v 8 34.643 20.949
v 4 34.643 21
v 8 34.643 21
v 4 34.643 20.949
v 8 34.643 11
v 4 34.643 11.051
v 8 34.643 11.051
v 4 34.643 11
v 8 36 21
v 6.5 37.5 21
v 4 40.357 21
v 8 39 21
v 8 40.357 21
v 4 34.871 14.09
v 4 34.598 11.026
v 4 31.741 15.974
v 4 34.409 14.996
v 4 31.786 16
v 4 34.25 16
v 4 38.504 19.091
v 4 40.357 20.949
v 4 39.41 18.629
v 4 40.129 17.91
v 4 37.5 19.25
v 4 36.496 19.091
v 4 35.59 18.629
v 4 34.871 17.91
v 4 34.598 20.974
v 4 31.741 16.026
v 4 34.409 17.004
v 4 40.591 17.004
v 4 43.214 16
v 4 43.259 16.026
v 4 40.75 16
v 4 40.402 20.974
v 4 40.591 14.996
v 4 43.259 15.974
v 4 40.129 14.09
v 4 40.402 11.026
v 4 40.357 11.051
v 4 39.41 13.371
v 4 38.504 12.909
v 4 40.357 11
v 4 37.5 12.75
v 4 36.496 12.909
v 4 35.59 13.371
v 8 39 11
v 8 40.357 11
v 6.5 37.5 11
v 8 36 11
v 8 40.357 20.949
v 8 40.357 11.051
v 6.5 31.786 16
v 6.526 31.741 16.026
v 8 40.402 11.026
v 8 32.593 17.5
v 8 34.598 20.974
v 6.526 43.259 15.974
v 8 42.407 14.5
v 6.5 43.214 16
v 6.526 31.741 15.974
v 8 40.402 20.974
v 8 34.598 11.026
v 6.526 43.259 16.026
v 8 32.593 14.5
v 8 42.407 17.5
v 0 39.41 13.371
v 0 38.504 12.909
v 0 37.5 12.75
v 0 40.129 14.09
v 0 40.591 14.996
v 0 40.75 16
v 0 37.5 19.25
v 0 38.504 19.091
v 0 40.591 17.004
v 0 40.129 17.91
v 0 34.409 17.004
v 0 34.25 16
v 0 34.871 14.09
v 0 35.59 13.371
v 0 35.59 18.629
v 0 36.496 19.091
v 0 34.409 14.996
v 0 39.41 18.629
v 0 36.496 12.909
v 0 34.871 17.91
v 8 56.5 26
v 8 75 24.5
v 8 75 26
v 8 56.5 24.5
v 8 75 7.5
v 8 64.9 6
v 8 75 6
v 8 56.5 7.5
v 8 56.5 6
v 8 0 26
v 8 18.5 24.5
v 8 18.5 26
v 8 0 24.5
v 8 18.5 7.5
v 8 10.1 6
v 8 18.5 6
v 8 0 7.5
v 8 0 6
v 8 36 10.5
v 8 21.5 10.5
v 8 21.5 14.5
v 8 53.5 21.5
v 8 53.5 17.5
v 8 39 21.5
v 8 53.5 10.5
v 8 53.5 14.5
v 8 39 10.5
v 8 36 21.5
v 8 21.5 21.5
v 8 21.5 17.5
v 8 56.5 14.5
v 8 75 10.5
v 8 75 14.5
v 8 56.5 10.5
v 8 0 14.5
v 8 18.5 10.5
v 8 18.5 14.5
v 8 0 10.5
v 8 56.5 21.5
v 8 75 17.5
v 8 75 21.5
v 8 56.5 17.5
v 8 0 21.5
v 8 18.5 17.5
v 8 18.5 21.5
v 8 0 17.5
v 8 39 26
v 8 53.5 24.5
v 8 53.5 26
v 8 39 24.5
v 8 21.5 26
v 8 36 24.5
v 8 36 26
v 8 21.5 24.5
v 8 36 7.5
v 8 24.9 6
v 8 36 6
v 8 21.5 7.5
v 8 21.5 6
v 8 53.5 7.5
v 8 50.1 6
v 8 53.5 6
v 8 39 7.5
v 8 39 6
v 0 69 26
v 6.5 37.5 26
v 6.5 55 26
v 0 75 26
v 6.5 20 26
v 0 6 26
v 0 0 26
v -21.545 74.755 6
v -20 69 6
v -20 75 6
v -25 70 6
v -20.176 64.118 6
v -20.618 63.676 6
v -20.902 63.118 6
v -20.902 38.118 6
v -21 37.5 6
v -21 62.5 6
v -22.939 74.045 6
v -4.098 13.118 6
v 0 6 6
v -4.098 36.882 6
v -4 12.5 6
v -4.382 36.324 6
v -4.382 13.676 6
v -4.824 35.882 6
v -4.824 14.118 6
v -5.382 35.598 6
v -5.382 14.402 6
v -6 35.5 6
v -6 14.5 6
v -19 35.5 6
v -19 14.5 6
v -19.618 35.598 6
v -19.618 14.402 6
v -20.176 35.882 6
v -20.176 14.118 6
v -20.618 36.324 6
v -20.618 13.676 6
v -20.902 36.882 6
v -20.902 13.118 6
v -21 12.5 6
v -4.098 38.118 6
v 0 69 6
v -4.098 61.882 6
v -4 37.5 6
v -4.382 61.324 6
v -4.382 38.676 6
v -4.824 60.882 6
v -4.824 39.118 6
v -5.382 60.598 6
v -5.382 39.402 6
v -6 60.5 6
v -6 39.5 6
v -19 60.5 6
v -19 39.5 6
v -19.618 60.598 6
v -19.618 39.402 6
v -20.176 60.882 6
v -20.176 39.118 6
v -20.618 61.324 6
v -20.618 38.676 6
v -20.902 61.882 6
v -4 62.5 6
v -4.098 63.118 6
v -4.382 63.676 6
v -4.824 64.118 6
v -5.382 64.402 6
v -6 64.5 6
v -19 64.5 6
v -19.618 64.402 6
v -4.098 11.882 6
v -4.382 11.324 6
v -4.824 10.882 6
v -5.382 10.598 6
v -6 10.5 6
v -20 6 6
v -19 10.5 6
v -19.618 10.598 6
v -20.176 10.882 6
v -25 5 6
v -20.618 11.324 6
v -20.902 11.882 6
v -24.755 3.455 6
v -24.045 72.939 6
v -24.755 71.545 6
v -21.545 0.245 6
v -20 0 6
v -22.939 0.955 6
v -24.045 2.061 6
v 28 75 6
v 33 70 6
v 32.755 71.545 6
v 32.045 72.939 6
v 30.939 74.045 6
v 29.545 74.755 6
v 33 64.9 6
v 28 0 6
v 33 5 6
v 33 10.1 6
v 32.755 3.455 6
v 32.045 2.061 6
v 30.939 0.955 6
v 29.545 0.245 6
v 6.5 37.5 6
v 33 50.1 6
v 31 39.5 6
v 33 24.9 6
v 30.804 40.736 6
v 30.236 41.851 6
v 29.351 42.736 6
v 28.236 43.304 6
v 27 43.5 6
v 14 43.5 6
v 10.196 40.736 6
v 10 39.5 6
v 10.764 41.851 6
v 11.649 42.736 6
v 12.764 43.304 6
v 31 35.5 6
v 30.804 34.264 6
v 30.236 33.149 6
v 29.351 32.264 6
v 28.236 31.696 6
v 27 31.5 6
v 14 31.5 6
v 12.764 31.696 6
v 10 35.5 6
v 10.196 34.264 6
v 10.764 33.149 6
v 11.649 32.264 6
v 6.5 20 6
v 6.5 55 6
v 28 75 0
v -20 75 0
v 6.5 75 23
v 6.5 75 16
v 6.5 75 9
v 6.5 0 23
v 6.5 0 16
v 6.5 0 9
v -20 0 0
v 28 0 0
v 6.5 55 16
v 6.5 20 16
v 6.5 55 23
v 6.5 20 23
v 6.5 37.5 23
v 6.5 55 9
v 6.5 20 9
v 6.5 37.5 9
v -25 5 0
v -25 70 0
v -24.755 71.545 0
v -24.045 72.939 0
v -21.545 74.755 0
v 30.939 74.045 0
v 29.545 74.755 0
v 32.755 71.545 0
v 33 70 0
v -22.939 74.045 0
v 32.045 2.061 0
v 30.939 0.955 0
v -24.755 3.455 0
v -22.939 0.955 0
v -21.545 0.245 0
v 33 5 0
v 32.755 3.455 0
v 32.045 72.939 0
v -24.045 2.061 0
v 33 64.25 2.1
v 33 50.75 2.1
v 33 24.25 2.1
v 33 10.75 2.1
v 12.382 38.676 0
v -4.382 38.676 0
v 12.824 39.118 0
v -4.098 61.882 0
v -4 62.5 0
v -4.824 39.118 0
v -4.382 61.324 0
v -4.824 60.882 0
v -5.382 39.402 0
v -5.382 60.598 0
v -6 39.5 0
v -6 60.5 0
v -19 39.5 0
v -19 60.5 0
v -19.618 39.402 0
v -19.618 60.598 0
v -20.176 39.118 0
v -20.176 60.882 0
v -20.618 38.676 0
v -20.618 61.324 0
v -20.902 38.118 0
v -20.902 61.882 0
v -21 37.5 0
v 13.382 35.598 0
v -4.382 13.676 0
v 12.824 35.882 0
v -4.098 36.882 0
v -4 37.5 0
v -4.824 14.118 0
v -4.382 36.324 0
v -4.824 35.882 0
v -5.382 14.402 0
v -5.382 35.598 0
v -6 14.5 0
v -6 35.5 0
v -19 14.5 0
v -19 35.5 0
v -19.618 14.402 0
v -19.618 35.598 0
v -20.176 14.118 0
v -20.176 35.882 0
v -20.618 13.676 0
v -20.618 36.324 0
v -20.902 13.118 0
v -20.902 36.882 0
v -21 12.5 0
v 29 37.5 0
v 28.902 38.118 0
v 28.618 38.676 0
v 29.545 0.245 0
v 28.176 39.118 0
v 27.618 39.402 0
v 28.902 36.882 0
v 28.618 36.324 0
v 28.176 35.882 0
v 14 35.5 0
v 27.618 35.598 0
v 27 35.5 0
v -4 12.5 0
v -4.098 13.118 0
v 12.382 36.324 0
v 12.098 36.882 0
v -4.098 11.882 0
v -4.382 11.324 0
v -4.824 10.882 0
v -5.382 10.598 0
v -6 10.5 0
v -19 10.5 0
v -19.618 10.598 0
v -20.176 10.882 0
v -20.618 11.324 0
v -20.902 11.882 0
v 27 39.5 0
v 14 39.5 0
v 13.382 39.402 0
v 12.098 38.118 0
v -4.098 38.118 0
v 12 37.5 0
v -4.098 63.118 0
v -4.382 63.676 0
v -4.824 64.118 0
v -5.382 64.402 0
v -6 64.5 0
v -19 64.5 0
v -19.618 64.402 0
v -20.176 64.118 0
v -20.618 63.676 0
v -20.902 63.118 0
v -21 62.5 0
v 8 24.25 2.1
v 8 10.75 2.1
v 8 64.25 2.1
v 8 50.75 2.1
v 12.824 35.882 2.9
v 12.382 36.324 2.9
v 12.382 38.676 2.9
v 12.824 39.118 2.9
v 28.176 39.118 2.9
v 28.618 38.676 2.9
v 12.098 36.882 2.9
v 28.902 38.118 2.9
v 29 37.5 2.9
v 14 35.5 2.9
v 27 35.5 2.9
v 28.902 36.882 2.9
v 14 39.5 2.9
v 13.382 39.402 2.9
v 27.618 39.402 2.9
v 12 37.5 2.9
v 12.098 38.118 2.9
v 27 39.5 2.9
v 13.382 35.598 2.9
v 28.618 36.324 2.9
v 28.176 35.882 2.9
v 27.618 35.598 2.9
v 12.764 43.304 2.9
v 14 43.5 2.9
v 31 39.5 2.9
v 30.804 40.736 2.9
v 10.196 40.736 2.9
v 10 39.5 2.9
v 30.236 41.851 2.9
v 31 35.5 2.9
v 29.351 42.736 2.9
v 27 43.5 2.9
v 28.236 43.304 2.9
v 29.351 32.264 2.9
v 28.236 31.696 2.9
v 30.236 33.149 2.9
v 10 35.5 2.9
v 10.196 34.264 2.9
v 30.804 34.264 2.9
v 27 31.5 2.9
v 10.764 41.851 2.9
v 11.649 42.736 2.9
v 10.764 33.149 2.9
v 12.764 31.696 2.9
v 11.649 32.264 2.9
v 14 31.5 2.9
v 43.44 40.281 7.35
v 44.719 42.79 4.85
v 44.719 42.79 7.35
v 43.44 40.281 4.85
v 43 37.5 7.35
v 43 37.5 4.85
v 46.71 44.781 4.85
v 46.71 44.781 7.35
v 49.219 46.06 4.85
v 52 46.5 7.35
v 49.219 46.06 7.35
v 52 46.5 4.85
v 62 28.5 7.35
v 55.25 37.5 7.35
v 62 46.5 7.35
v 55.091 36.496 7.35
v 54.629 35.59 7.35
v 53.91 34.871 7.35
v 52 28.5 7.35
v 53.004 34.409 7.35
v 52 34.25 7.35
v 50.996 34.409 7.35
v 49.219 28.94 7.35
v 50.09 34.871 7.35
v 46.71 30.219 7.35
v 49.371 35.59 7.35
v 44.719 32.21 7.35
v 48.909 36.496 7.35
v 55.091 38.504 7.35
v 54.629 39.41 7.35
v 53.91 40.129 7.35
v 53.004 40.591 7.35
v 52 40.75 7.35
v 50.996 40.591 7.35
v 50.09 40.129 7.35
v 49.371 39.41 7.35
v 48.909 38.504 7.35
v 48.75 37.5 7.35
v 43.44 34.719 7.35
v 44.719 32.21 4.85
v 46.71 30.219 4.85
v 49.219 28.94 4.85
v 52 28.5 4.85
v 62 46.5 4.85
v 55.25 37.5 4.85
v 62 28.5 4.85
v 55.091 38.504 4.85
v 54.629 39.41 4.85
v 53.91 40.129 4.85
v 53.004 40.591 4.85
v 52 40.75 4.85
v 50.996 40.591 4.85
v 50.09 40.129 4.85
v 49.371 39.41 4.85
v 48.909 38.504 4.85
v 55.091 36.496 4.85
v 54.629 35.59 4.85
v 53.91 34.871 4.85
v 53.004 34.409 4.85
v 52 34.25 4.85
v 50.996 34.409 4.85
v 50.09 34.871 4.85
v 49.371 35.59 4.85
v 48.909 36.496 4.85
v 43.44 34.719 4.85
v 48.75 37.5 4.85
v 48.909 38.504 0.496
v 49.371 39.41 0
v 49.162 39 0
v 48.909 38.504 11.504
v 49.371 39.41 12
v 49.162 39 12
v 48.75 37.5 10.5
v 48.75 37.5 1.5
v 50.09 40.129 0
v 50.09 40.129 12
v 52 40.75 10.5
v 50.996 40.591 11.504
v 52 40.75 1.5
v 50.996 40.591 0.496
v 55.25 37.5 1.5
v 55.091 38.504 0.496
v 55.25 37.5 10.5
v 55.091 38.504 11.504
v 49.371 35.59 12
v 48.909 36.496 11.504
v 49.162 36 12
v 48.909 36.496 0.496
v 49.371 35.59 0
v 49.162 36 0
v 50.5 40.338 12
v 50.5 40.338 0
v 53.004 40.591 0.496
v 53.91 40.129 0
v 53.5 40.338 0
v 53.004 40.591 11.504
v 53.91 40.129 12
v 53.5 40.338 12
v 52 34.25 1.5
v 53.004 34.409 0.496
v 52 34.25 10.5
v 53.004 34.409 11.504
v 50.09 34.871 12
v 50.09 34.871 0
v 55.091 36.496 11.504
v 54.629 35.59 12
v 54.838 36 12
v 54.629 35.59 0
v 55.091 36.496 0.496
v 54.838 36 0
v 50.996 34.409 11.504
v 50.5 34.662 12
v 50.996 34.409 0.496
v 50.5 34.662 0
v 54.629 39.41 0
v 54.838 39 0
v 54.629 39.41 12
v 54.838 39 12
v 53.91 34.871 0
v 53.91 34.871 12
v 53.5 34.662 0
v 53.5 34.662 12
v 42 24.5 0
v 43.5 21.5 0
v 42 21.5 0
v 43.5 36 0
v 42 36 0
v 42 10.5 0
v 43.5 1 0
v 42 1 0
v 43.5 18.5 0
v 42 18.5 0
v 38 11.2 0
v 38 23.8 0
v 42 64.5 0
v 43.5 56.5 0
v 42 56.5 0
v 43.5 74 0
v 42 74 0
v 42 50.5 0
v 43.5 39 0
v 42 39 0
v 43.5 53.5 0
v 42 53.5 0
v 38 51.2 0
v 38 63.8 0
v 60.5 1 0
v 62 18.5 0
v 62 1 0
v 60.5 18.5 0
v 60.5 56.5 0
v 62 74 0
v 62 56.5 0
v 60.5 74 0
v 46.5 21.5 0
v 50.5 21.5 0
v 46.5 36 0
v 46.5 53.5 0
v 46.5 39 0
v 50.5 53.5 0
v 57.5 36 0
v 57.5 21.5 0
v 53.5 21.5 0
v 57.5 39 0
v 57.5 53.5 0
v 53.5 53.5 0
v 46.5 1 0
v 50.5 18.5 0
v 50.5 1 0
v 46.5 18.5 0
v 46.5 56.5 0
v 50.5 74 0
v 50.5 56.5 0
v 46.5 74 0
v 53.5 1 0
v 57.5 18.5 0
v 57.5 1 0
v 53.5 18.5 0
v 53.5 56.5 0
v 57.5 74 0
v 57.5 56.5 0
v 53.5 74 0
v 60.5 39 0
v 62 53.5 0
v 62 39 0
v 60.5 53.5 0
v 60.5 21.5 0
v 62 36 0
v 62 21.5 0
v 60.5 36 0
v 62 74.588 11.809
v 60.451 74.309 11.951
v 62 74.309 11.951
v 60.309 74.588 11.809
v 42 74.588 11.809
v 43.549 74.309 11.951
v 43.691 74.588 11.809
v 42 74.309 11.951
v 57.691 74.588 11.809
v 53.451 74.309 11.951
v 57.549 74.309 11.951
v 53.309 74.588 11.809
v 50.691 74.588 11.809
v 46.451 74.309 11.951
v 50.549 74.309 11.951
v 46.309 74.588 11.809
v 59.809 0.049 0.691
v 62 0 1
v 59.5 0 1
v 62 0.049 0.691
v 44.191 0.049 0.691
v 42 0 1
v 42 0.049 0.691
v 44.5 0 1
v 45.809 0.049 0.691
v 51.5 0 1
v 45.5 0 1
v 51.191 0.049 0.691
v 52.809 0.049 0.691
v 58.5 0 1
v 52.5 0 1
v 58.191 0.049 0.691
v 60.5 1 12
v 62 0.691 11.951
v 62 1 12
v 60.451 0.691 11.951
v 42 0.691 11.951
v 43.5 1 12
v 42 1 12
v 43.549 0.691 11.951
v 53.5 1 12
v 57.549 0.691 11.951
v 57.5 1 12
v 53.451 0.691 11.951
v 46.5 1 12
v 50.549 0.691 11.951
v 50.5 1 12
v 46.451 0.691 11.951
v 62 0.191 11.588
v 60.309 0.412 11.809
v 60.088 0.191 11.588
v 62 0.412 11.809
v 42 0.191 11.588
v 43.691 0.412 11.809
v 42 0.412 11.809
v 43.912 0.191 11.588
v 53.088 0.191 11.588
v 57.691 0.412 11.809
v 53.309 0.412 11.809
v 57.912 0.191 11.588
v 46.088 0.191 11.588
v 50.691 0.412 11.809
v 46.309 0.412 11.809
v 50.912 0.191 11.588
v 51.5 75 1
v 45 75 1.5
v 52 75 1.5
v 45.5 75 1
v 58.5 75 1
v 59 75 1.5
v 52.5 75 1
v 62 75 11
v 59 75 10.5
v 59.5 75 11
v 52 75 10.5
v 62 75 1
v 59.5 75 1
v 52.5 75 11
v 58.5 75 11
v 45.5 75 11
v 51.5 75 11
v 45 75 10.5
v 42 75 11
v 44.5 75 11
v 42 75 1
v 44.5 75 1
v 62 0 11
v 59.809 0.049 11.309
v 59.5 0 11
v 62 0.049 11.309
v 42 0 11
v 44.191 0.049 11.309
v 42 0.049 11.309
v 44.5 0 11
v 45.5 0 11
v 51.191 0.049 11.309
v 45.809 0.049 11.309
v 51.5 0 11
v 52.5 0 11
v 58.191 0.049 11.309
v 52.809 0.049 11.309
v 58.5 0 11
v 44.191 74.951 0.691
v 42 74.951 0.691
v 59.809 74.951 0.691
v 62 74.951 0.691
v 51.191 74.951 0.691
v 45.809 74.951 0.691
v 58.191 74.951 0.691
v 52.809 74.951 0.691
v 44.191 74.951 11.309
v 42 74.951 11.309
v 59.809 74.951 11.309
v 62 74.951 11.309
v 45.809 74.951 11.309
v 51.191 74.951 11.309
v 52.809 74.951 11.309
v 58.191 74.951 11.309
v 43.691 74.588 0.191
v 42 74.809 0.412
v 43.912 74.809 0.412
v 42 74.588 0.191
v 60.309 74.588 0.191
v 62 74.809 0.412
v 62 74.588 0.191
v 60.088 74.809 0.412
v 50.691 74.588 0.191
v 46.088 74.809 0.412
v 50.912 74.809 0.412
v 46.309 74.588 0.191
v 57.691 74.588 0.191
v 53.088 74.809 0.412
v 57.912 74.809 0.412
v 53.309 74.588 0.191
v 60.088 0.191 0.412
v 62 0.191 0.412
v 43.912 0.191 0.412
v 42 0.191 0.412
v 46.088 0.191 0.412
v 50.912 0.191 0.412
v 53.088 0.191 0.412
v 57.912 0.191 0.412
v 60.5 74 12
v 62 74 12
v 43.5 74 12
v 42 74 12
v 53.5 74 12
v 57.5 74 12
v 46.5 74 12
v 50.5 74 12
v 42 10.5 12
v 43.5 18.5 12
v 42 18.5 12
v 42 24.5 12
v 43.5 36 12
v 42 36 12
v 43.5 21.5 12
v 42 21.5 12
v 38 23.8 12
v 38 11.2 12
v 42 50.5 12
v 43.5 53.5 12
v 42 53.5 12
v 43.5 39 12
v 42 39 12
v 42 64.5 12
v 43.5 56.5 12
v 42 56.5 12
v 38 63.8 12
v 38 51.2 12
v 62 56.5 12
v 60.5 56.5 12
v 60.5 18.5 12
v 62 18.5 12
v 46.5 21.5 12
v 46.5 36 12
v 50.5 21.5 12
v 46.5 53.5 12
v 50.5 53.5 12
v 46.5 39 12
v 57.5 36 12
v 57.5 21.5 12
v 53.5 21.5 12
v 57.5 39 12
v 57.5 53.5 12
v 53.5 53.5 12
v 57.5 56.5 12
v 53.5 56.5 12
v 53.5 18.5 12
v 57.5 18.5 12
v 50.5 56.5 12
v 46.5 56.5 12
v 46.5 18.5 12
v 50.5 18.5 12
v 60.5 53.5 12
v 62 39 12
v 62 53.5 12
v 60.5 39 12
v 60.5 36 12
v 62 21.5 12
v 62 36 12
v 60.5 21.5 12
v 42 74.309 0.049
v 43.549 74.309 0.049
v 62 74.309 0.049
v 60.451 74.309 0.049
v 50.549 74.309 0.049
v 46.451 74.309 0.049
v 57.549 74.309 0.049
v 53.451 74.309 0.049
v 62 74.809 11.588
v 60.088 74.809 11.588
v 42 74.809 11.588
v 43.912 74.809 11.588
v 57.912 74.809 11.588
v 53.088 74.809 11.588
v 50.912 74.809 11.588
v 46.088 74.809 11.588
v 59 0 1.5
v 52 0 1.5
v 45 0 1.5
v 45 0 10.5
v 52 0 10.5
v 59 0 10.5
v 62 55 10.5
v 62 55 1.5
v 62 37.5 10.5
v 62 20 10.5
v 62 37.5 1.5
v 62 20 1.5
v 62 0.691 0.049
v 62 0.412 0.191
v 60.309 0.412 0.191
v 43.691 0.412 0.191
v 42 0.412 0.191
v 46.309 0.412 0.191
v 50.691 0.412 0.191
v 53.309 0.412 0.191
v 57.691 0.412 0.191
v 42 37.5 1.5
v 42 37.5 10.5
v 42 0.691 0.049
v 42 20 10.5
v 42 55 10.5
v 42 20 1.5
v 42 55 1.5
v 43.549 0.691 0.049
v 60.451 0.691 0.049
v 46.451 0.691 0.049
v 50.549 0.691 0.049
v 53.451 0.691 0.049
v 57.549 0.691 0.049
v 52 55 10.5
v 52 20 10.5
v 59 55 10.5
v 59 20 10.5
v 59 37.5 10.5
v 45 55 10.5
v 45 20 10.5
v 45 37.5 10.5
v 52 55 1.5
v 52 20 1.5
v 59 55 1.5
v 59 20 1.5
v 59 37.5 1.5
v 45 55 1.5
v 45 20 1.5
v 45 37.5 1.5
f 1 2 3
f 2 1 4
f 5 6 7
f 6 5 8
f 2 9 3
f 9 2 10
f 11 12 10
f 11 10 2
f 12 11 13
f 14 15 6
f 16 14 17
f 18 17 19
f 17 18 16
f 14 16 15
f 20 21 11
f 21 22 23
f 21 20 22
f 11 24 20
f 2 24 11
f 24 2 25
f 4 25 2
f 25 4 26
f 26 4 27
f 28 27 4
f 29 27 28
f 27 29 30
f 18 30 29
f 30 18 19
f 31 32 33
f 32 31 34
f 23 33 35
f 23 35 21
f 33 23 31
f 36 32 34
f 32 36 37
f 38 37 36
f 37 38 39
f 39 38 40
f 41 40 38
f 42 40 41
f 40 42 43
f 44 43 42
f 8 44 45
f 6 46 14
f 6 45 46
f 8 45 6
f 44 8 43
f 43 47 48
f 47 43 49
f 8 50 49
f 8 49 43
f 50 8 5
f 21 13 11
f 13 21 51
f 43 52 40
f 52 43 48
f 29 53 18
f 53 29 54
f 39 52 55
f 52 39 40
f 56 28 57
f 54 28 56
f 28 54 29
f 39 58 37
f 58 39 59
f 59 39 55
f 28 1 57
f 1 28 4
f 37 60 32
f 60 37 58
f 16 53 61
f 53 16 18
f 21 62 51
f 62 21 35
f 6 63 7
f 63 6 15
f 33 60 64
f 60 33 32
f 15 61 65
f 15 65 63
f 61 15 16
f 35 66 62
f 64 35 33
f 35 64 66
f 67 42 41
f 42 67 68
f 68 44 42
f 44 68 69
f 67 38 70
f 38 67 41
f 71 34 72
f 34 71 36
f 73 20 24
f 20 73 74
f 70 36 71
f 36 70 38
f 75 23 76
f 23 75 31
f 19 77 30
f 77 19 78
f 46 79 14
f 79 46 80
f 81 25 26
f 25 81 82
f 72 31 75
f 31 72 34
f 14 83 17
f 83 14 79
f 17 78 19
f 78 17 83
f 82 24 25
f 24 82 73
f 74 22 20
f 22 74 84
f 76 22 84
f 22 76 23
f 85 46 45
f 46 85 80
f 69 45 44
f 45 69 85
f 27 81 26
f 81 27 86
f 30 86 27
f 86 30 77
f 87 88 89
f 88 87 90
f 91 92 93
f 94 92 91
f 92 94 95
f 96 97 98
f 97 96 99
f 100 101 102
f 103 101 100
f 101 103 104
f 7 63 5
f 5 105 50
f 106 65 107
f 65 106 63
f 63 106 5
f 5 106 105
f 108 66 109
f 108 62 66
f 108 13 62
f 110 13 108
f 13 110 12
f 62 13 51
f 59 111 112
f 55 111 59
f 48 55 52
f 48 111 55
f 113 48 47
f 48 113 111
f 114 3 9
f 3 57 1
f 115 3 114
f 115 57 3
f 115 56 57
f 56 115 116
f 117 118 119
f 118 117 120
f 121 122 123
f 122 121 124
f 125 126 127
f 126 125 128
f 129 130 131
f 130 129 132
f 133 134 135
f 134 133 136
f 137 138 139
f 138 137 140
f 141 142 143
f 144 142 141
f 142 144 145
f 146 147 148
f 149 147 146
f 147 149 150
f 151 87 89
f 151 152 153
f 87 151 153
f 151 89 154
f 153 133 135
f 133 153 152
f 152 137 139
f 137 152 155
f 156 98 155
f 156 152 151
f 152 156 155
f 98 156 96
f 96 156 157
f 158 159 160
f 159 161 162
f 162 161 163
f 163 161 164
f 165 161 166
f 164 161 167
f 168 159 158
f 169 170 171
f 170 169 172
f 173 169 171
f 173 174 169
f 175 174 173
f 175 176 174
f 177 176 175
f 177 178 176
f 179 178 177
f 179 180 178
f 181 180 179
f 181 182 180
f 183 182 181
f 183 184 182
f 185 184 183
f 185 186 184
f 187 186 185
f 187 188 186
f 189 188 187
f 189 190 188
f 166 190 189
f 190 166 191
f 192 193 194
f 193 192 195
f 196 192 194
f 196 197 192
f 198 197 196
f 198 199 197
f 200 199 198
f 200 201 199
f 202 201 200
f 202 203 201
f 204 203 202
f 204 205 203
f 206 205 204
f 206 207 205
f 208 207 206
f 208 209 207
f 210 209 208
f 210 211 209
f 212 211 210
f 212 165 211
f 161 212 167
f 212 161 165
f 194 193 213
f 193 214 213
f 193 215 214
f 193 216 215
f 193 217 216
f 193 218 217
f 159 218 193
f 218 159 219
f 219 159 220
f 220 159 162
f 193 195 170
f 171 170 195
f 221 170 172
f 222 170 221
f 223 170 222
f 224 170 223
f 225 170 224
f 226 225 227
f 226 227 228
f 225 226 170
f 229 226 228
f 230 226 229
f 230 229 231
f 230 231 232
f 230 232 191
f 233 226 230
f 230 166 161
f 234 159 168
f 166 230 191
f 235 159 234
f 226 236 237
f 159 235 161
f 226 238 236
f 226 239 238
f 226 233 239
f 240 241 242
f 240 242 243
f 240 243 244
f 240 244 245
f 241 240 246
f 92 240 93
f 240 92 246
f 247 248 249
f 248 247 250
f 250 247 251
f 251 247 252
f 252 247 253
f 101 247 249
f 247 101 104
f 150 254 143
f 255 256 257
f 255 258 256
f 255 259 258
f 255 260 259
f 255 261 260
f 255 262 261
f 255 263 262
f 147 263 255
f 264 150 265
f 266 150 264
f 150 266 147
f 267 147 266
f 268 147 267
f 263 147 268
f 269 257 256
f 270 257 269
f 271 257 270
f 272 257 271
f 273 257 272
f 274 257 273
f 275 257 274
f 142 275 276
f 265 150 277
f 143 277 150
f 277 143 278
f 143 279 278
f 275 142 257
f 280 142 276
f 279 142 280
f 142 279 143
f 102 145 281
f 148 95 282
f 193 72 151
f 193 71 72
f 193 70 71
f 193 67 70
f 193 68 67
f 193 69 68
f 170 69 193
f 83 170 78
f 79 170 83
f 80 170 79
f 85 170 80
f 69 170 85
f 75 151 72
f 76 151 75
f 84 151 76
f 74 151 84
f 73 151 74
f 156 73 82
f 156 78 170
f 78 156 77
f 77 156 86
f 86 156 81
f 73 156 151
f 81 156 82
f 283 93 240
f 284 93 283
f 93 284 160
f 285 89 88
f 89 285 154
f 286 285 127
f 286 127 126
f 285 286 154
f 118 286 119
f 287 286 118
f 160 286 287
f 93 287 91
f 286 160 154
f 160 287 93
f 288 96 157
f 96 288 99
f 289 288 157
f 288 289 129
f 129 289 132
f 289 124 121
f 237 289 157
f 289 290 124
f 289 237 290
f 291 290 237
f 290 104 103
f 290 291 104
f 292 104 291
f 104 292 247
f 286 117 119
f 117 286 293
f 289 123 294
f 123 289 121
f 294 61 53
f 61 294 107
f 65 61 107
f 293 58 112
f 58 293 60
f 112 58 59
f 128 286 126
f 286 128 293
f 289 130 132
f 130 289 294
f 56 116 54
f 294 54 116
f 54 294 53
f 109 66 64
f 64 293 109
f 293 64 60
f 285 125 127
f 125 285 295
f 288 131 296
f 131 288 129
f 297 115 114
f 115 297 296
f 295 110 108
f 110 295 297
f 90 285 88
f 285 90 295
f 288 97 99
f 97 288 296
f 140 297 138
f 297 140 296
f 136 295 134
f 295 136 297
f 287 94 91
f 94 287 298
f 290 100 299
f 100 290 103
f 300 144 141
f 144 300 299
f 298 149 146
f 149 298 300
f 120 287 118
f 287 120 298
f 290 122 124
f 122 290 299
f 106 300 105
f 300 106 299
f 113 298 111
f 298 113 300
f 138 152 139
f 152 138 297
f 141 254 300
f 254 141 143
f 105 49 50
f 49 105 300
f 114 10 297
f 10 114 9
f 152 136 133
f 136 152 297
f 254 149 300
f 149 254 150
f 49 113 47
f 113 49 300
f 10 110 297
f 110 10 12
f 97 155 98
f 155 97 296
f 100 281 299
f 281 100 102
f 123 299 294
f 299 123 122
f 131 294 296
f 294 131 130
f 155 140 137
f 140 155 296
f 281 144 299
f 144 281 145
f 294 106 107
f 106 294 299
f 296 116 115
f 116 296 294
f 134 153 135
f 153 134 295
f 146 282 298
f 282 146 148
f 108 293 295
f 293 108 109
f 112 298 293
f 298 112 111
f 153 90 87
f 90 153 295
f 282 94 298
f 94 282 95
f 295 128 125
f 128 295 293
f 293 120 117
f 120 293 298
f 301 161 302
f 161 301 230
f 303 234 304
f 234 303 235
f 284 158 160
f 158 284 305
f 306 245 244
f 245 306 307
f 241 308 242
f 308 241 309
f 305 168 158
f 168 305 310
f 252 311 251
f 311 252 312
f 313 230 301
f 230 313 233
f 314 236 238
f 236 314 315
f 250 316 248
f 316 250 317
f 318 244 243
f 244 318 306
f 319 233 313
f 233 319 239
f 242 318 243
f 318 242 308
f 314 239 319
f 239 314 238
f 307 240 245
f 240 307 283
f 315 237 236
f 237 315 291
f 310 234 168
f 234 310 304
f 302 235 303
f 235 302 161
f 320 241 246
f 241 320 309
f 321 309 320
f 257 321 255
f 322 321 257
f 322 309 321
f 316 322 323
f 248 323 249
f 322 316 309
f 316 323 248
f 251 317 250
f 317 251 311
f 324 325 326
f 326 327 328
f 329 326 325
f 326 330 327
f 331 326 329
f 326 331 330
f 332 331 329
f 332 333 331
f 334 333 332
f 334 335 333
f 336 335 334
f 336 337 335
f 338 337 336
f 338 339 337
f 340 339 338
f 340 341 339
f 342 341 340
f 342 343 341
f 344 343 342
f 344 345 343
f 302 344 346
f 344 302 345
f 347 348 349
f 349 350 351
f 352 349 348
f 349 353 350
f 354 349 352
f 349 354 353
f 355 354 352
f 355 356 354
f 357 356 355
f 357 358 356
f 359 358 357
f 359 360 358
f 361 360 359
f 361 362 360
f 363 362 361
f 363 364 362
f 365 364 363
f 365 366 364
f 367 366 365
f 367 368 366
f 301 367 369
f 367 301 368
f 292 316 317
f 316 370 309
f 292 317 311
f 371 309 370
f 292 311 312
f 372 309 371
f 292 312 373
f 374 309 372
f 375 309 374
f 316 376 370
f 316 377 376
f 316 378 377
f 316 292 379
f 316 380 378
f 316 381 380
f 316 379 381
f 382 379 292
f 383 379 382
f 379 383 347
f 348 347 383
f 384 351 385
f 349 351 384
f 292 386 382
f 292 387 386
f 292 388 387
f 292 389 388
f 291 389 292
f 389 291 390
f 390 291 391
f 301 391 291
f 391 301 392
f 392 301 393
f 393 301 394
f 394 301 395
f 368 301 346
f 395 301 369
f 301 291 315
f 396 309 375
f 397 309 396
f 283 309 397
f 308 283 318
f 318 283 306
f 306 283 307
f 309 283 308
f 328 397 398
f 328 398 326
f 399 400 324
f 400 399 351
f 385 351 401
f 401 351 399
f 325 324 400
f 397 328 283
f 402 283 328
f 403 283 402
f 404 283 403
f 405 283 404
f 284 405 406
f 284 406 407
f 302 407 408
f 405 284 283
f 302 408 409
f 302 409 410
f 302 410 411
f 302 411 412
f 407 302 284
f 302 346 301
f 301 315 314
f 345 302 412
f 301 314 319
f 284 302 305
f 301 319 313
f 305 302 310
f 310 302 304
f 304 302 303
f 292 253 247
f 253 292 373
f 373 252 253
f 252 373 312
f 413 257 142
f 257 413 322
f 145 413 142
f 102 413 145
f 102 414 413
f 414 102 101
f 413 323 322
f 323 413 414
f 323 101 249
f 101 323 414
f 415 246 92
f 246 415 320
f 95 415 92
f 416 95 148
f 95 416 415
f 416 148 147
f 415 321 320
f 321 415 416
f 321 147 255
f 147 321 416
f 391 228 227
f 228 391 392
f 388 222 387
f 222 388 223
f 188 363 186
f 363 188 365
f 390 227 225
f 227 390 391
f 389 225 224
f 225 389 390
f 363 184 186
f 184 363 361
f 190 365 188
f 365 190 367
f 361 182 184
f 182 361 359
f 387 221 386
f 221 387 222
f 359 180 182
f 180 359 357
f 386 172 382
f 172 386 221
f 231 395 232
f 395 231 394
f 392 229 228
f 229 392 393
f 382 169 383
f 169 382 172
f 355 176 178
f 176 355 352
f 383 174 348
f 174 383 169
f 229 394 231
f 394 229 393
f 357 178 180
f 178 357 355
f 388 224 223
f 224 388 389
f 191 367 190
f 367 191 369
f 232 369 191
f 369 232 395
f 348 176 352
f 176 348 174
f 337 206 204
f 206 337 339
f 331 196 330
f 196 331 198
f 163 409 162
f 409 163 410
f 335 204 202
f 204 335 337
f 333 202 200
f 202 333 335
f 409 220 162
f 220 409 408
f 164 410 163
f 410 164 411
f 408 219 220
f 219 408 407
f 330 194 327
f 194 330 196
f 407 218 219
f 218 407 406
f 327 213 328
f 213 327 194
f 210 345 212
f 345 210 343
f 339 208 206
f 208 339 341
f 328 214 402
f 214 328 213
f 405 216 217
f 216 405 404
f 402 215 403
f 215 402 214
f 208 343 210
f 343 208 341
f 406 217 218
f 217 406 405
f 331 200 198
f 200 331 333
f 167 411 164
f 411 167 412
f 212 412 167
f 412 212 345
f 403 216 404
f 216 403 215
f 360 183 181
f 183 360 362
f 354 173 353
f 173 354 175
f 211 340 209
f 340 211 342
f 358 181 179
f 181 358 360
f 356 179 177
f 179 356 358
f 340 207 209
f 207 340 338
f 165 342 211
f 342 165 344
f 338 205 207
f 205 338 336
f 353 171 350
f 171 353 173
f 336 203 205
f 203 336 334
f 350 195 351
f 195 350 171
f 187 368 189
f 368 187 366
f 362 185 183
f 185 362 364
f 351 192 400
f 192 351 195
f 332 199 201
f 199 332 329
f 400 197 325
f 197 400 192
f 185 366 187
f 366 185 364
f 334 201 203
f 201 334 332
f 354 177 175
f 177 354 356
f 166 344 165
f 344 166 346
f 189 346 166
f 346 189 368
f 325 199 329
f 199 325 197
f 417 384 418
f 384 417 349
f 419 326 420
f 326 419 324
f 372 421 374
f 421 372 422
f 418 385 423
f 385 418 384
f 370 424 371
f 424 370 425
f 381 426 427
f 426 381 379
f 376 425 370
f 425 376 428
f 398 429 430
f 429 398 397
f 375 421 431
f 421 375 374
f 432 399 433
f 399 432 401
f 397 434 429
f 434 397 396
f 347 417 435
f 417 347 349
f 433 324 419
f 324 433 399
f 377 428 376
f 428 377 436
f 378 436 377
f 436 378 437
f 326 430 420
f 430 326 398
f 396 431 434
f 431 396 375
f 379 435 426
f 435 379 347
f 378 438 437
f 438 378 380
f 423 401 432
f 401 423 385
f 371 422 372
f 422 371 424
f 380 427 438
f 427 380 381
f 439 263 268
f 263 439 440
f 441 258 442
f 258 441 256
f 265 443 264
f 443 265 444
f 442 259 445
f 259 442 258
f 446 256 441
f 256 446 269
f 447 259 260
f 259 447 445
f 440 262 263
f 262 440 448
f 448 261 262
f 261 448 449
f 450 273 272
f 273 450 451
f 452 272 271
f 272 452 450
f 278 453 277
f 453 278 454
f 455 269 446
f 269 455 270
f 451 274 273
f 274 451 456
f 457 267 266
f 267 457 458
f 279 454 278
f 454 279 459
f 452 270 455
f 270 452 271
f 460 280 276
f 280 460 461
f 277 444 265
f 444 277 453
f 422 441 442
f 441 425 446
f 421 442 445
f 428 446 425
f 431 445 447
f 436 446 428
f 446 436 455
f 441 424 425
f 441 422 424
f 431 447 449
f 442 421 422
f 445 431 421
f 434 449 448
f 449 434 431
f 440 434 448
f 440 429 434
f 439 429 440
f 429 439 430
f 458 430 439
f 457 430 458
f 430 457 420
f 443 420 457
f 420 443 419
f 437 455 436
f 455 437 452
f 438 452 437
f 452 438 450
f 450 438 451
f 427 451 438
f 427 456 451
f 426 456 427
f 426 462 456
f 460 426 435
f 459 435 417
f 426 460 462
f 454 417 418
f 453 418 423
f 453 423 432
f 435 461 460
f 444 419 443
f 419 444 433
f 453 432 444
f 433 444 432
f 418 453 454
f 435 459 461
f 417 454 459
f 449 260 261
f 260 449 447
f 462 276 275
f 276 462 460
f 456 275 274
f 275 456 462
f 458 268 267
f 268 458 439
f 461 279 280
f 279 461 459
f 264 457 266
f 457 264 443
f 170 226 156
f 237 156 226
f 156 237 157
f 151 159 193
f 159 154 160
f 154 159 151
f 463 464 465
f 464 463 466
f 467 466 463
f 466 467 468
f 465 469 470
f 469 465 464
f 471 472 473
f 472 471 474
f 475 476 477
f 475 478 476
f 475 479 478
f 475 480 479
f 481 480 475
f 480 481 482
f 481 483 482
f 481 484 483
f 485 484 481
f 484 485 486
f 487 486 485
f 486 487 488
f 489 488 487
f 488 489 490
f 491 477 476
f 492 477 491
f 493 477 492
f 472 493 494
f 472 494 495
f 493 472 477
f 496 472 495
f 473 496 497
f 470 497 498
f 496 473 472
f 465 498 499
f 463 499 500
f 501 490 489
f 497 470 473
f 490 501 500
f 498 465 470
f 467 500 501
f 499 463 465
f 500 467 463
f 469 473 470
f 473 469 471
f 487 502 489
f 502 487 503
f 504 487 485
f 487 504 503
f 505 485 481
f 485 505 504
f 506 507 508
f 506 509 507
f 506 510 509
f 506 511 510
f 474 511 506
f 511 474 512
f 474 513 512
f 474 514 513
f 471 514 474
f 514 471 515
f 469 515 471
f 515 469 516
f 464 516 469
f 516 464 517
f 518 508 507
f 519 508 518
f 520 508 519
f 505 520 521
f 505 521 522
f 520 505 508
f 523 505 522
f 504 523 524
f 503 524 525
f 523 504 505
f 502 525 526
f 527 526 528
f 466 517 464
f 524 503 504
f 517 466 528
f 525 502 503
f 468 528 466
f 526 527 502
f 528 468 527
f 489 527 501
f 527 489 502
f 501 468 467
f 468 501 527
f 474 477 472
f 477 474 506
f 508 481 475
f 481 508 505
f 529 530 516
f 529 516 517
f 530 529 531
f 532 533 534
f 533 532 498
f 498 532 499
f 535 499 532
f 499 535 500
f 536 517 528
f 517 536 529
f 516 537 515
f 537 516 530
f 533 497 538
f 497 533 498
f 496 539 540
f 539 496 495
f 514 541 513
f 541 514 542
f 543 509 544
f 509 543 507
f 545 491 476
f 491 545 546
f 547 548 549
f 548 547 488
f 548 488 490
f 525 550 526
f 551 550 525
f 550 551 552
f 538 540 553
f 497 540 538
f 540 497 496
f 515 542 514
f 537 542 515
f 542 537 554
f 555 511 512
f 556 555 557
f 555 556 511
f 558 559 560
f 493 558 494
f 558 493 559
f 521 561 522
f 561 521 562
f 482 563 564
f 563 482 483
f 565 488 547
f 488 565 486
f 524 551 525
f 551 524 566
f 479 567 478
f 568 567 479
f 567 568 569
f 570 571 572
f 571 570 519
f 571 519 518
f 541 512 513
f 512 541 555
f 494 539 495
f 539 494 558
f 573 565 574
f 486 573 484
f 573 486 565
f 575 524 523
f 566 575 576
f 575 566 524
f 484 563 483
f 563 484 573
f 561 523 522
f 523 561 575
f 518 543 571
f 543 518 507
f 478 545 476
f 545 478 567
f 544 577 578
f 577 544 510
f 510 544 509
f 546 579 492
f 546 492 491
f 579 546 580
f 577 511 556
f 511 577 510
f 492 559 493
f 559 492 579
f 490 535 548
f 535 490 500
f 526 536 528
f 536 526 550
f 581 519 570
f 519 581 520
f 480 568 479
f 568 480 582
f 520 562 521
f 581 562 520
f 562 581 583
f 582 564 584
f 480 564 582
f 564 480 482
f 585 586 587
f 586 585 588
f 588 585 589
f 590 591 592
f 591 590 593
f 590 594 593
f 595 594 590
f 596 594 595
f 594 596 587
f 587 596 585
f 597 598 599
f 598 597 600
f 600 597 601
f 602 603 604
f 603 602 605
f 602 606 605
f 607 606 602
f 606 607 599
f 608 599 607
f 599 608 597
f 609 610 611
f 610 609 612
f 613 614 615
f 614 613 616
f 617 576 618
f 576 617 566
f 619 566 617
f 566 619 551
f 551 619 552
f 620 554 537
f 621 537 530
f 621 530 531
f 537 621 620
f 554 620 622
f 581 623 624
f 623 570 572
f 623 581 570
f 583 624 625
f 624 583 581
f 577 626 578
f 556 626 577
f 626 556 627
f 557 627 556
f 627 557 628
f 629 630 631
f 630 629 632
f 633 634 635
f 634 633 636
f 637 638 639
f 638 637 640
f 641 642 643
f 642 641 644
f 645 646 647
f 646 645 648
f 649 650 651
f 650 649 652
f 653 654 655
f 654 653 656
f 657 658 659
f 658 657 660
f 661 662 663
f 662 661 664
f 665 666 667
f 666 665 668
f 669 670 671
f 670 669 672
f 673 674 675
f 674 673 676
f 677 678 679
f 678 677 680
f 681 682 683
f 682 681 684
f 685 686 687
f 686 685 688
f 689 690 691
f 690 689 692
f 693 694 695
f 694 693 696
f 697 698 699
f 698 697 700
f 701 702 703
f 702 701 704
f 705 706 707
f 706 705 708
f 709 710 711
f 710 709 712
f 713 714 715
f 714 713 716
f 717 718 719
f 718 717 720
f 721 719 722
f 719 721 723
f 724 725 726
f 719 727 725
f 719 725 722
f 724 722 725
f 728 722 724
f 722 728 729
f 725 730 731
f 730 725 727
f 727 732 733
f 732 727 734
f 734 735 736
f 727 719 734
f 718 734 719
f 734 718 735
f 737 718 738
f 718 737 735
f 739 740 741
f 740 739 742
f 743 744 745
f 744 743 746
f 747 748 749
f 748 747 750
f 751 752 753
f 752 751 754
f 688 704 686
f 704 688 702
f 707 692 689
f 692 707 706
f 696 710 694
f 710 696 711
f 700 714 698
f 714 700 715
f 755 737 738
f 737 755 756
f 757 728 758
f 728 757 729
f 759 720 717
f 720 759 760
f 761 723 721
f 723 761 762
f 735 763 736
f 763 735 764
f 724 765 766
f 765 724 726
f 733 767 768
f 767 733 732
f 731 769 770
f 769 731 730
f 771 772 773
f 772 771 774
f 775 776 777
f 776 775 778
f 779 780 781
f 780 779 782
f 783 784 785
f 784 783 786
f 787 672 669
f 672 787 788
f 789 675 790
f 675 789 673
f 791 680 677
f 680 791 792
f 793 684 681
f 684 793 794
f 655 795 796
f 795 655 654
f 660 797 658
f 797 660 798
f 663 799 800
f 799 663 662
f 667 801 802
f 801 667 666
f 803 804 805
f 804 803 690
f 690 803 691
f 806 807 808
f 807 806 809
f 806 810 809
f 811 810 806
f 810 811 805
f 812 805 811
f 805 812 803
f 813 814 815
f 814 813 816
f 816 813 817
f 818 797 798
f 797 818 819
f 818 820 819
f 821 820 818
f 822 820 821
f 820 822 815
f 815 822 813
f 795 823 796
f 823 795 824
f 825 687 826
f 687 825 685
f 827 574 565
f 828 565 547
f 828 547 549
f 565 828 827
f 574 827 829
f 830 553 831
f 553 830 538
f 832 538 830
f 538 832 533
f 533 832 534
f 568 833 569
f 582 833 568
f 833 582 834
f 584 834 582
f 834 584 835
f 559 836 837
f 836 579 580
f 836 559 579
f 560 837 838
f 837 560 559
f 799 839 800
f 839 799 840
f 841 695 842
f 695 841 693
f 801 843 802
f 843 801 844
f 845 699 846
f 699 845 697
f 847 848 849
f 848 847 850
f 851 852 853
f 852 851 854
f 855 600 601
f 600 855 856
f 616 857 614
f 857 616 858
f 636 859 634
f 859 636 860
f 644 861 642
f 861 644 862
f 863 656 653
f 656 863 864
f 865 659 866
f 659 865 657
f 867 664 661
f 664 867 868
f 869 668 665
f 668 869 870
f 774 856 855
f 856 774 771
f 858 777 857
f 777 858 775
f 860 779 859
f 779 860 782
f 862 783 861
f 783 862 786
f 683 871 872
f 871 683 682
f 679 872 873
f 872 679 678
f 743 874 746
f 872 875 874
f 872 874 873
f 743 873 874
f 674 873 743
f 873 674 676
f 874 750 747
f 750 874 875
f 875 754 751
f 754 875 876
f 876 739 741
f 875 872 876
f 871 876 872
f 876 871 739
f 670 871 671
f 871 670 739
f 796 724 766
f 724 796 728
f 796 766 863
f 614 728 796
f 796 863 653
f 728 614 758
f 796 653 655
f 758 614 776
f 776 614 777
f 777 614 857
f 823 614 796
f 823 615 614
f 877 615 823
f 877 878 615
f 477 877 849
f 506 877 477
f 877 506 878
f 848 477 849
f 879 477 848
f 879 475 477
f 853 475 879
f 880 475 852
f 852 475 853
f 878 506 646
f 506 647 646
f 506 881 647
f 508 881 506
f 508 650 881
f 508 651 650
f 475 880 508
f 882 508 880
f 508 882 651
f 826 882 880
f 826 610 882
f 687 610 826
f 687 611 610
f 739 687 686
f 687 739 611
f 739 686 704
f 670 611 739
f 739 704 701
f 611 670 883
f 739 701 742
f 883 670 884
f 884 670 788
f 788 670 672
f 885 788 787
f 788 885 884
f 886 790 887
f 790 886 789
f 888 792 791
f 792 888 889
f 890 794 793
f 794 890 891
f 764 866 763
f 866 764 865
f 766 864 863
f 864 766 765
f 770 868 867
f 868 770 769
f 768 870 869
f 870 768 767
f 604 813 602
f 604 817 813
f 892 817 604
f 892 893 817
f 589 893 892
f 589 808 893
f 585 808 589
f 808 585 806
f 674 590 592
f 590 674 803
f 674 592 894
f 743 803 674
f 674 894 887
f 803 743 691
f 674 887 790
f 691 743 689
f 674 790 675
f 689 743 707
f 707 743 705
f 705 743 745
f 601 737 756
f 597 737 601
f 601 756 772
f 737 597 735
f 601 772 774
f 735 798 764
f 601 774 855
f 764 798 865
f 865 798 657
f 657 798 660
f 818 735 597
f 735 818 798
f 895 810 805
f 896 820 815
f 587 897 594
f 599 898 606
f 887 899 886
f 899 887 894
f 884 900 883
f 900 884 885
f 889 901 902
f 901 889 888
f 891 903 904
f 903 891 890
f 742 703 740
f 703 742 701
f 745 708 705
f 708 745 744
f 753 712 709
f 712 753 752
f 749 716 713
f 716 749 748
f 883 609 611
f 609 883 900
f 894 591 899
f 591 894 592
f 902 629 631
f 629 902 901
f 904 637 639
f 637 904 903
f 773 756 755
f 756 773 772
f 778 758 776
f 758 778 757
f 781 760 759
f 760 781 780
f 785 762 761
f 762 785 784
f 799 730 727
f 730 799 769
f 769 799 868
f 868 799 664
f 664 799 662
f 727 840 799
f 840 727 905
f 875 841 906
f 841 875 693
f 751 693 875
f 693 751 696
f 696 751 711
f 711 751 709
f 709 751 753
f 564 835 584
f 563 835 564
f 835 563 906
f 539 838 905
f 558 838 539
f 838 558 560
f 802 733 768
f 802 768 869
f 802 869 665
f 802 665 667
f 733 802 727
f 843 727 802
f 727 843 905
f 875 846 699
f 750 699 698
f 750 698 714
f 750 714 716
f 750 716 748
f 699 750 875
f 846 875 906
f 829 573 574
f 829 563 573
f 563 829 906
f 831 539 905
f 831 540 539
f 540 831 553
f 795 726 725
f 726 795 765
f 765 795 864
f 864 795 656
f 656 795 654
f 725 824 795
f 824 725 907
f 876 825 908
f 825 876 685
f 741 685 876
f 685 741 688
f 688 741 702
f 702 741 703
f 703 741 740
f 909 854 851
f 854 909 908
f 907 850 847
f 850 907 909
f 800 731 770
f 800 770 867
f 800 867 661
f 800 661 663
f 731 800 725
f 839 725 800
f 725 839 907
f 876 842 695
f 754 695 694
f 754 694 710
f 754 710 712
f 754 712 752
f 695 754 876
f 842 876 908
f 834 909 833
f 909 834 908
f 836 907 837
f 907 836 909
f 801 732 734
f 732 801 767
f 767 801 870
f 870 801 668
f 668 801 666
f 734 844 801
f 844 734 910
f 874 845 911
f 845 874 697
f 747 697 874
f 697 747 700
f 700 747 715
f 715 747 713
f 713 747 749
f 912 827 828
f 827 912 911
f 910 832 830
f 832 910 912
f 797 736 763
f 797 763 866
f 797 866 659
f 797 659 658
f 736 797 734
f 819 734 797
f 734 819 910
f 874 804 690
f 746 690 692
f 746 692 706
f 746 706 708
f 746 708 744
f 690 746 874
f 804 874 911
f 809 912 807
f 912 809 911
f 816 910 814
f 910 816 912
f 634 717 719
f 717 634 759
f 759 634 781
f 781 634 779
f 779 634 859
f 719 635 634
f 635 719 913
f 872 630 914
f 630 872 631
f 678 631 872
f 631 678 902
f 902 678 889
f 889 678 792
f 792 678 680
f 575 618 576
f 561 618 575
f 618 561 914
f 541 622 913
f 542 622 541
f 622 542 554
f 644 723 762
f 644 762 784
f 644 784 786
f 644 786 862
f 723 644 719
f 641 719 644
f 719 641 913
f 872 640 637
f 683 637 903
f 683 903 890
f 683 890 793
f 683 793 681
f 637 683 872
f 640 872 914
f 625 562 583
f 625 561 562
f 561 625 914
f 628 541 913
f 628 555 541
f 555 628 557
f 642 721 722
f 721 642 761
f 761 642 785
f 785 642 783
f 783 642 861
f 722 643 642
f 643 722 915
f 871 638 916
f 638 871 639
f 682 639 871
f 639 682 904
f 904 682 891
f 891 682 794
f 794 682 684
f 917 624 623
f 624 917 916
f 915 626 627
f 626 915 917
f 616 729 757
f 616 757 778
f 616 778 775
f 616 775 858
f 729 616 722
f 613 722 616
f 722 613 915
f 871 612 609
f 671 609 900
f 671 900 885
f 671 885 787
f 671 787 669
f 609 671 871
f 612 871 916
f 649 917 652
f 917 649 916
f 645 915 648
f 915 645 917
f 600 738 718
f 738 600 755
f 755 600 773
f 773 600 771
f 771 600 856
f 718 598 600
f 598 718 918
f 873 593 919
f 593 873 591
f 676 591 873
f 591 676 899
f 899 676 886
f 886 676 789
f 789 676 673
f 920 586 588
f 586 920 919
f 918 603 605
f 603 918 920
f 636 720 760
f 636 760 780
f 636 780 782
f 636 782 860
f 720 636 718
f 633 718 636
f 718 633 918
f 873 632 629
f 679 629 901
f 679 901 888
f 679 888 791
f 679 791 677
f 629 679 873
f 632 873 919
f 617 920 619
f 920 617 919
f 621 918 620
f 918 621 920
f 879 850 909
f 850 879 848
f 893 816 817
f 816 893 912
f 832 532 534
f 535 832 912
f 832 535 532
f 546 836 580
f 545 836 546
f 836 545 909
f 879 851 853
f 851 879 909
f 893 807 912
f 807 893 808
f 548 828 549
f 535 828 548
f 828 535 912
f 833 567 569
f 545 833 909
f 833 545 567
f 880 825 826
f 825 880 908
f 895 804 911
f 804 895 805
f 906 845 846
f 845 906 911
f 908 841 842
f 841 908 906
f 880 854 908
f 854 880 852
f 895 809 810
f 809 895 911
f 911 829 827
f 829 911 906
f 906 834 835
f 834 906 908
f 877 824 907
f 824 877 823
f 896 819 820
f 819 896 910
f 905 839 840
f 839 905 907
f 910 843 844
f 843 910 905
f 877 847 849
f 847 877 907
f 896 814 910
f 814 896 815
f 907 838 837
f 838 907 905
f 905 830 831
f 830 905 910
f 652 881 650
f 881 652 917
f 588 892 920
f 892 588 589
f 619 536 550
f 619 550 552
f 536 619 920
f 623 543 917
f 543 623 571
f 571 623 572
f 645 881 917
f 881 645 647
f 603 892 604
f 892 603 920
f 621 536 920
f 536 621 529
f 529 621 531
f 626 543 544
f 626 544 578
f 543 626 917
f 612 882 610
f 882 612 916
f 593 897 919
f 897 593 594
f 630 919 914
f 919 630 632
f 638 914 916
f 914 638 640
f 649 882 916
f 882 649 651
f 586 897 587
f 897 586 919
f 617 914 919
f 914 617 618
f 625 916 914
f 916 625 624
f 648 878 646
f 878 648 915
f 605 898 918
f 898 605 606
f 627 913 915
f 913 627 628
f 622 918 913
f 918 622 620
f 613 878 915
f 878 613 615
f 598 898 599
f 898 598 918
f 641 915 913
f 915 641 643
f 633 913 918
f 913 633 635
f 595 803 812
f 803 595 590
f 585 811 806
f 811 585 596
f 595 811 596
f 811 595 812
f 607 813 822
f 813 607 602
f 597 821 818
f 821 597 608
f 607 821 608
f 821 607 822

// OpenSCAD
// Copyright (C) Peter Ivanov <ivanovp@gmail.com>, 2015, 2016
// License: Creative Commons - Attribution - Non-commercial (CC BY-NC)
// Version: 3 

part = "print"; // [print:Print,base:Base Only,jaw:Jaw Only,jaw_rot:Jaw Only Rotated,both:Base and Jaw]

// Height of support and jaw
height = 20; // [10:50]
// Thickness of base
base_thickness = 6; // [5:12]
// Thickness of support
support_thickness = 8; // [5:15]
// Width of support and jaw
width = 75; // [40:200]
// Base's edges
edge_round = 5; // [1:10]

// M6 = 10 mm, M5 = 8 mm
nut_width = 10; // [5:0.1:15]
// 6.5 mm for M6, 5.5 mm for M5
nut_diameter = 6.5; // [3:0.1:10]

// Length of slots
slot_length = 25; // [15:100]
slot_width = 4; // [3:10]
// Must be less than base_thickness!
slot_sink = 3; // [1:12]
// Must be less than width!
major_slot_distance = 50; // [20:200]
// Must be less than width!
minor_slot_distance = 25; // [0:150]
// Depth of slot
holder_slot_depth = 1.5; // [0.2:0.1:2]
// Horizontal distance from perimeter of jaw
holder_slot_pos_horiz = 3; // [2:20]
// Vertical distance from perimeter of jaw
holder_slot_pos_vert = 20; // [2:20]

jaw_thickness = 12; // [4:20]
// Depth of jaw's rail
rail_depth = 4; // [1:10]
// Width of jaw's rail
rail_width = 15; // [5:60]
// Length of jaw' rail
rail_length = 25; // [10:150]
// Distance from perimeter of base
rail_distance = 10; // [5:25]
rail_shape = -0.05; // [-0.4:0.05:0.4]

// Diameter of washer
washer_diameter = 18; /* 18 for M5 */
// Thickness of washer
washer_thickness = 2.5; // [1:0.1:4]

/* [Hidden] */
// Internal variables
drill_h = base_thickness + 0.5 * height;
epsilon = 0.1;
gamma = 0.5;
fn = 20;
$fn = 20;
holder_slot_w = 5;
x = sqrt(2) * holder_slot_w / 2;

/* Vice */
if (part == "both" || part == "base" || part == "print")
union()
{
    difference()
    {
        /* Support */
        translate([0, 0, base_thickness]) cube([support_thickness, width, height]);
        /* Drill for nut */
        translate([0.5 * support_thickness, width / 2, drill_h]) rotate([0, 90, 0])
        {
            union()
            {
                translate([0, 0, support_thickness / 2]) hexagon(nut_width, support_thickness, 90);
                cylinder(d = nut_diameter, h = support_thickness * 2, center=true, $fn=fn);
            }
        }
        /* Horizontal holder slot */
        translate([support_thickness + x - holder_slot_depth, width / 2, drill_h]) rotate([0, 45, 0]) cube([holder_slot_w, width, holder_slot_w], true);
        translate([support_thickness + x - holder_slot_depth, width / 2, base_thickness + height - holder_slot_pos_horiz]) rotate([0, 45, 0]) cube([holder_slot_w, width, holder_slot_w], true);
        translate([support_thickness + x - holder_slot_depth, width / 2, base_thickness + holder_slot_pos_horiz]) rotate([0, 45, 0]) cube([holder_slot_w, width, holder_slot_w], true);

        /* Vertical holder slot */
        translate([support_thickness + x - holder_slot_depth, width / 2, base_thickness + height / 2]) rotate([0, 0, 45]) cube([holder_slot_w, holder_slot_w, height], true);
        translate([support_thickness + x - holder_slot_depth, holder_slot_pos_vert, base_thickness + height / 2]) rotate([0, 0, 45]) cube([holder_slot_w, holder_slot_w, height], true);
        translate([support_thickness + x - holder_slot_depth, width - holder_slot_pos_vert, base_thickness + height / 2]) rotate([0, 0, 45]) cube([holder_slot_w, holder_slot_w, height], true);
    }
    translate([-slot_length, 0, 0])
    {
        difference()
        {
            rounded_cube(slot_length + rail_length + support_thickness, width, base_thickness, edge_round);
            //cube([slot_length * 2, width, base_thickness]);
            /* Rails */
            translate([slot_length + support_thickness, rail_distance, base_thickness - rail_depth + epsilon]) 
              rail(rail_length + epsilon, rail_width, rail_depth + gamma);
            translate([slot_length + support_thickness, width - rail_distance - rail_width, base_thickness - rail_depth + epsilon]) 
              rail(rail_length + epsilon, rail_width, rail_depth + gamma);
            /* Slots */
            translate([slot_width, width / 2 - major_slot_distance / 2 - slot_width / 2, -epsilon])
              rounded_cube(slot_length - slot_width * 2, slot_width, height, slot_width / 2);
            translate([slot_width, width / 2 + major_slot_distance / 2 - slot_width / 2, -epsilon])
              rounded_cube(slot_length - slot_width * 2, slot_width, height, slot_width / 2);
            translate([slot_width, width / 2 - major_slot_distance / 2 + minor_slot_distance - slot_width / 2, -epsilon])
              rounded_cube(slot_length - slot_width * 2, slot_width, height, slot_width / 2);
            translate([slot_width, width / 2 + major_slot_distance / 2 - minor_slot_distance - slot_width / 2, -epsilon])
              rounded_cube(slot_length - slot_width * 2, slot_width, height, slot_width / 2);
            /* Sinked slot */
            translate([slot_length + support_thickness + slot_width, width / 2 - slot_width / 2, -epsilon])
              rounded_cube(rail_length - slot_width * 2, slot_width, height, slot_width / 2);
            translate([slot_length + support_thickness + slot_width / 2, width / 2 - slot_width / 2, base_thickness - slot_sink - epsilon])
              rounded_cube(rail_length - slot_width, slot_width, height, slot_width);
        }
    }
    q = min(height,slot_length - edge_round);
    translate([0, 0, height + base_thickness]) rotate([0, 90, 90]) linear_extrude(base_thickness) polygon(points=[[0, 0], [height, q],[height, 0]] );
    translate([0, width - base_thickness, height + base_thickness]) rotate([0, 90, 90]) linear_extrude(base_thickness) polygon(points=[[0, 0], [height, q], [height, 0]] );
}

/* Slide */
if (part == "both" || part == "jaw" || part == "jaw_rot" || part == "print")
{
    rot = (part == "jaw_rot") || (part == "print") ? 90 : 0;
    trans_y = (part == "print") ? rail_length + support_thickness + 3 : 0;
    trans_x = (part == "both") ? (rail_length + support_thickness) + 20 : -jaw_thickness;
    
    rotate([0, rot, 0]) translate([trans_x, 0, trans_y])
    {
        union()
        {
            difference()
            {
                translate([0, 0, base_thickness]) rounded_cube(jaw_thickness, width, height, 1);
                translate([-epsilon, width / 2, drill_h]) rotate([0, 90, 0])
                {
                    union()
                    {
                        translate([0, 0, jaw_thickness / 2]) union()
                        {
                            cylinder(d = washer_diameter, h = washer_thickness, center=true, $fn=fn);
                            translate([-height / 2, 0, 0]) cube([height, washer_diameter, washer_thickness], center=true);
                        }
                        cylinder(d = nut_diameter, h = jaw_thickness + epsilon * 2, center=false, $fn=fn);
                    }
                }
                /* Horizontal holder slot */
                translate([-x + holder_slot_depth, width / 2, drill_h]) rotate([0, 45, 0]) cube([holder_slot_w, width, holder_slot_w], true);
                translate([-x + holder_slot_depth, width / 2, base_thickness + height - holder_slot_pos_horiz]) rotate([0, 45, 0]) cube([holder_slot_w, width, holder_slot_w], true);
                translate([-x + holder_slot_depth, width / 2, base_thickness + holder_slot_pos_horiz]) rotate([0, 45, 0]) cube([holder_slot_w, width, holder_slot_w], true);

                translate([jaw_thickness + x - holder_slot_depth, width / 2, drill_h]) rotate([0, 45, 0]) cube([holder_slot_w, width, holder_slot_w], true);
                translate([jaw_thickness + x - holder_slot_depth, width / 2, base_thickness + height - holder_slot_pos_horiz]) rotate([0, 45, 0]) cube([holder_slot_w, width, holder_slot_w], true);
                translate([jaw_thickness + x - holder_slot_depth, width / 2, base_thickness + holder_slot_pos_horiz]) rotate([0, 45, 0]) cube([holder_slot_w, width, holder_slot_w], true);

                /* Vertical holder_slot */
                translate([-x + holder_slot_depth, width / 2, base_thickness + height / 2]) rotate([0, 0, 45]) cube([holder_slot_w, holder_slot_w, height], true);
                translate([-x + holder_slot_depth, holder_slot_pos_vert, base_thickness + height / 2]) rotate([0, 0, 45]) cube([holder_slot_w, holder_slot_w, height], true);
                translate([-x + holder_slot_depth, width - holder_slot_pos_vert, base_thickness + height / 2]) rotate([0, 0, 45]) cube([holder_slot_w, holder_slot_w, height], true);

                translate([jaw_thickness + x - holder_slot_depth, width / 2, base_thickness + height / 2]) rotate([0, 0, 45]) cube([holder_slot_w, holder_slot_w, height], true);
                translate([jaw_thickness + x - holder_slot_depth, holder_slot_pos_vert, base_thickness + height / 2]) rotate([0, 0, 45]) cube([holder_slot_w, holder_slot_w, height], true);
                translate([jaw_thickness + x - holder_slot_depth, width - holder_slot_pos_vert, base_thickness + height / 2]) rotate([0, 0, 45]) cube([holder_slot_w, holder_slot_w, height], true);
            }
            translate([0, rail_distance + gamma, base_thickness - rail_depth])
                rail(jaw_thickness, rail_width - gamma * 2, rail_depth);
            translate([0, width - rail_distance - rail_width + gamma, base_thickness - rail_depth])
                rail(jaw_thickness, rail_width - gamma * 2, rail_depth);
        }
    }
}

/*** Helper functions ***/
module rail(l,rail_width,rail_depth)
{
    rail_delta = min(rail_width * abs(rail_shape), 2);
    if (rail_shape > 0)
    {
        rotate([0, 90, 0]) linear_extrude(l) 
            polygon( points=[[0,0],[-rail_depth,rail_delta],[-rail_depth,rail_width - rail_delta],[0,rail_width]] );
    }
    else
    {
        rotate([0, 90, 0]) linear_extrude(l) 
            polygon( points=[[0,rail_delta],[-rail_depth,0],[-rail_depth,rail_width],[0,rail_width - rail_delta]] );
    }
}

module rounded_cube(w, l, h, r)
{
    hull()
    {
     translate([0 + r, 0 + r, 0]) cylinder(r=r, h=h);
     translate([w - r, 0 + r, 0]) cylinder(r=r, h=h);
     translate([w - r, l - r, 0]) cylinder(r=r, h=h);
     translate([0 + r, l - r, 0]) cylinder(r=r, h=h);
    }
}

module hexagon(width, height, baseAngle) 
{
  bwidth = width / 1.75;
  for (angle = [baseAngle, baseAngle + 60, baseAngle + 120]) 
  {
      rotate([0, 0, angle]) cube([bwidth, width, height], true);
  }
}
